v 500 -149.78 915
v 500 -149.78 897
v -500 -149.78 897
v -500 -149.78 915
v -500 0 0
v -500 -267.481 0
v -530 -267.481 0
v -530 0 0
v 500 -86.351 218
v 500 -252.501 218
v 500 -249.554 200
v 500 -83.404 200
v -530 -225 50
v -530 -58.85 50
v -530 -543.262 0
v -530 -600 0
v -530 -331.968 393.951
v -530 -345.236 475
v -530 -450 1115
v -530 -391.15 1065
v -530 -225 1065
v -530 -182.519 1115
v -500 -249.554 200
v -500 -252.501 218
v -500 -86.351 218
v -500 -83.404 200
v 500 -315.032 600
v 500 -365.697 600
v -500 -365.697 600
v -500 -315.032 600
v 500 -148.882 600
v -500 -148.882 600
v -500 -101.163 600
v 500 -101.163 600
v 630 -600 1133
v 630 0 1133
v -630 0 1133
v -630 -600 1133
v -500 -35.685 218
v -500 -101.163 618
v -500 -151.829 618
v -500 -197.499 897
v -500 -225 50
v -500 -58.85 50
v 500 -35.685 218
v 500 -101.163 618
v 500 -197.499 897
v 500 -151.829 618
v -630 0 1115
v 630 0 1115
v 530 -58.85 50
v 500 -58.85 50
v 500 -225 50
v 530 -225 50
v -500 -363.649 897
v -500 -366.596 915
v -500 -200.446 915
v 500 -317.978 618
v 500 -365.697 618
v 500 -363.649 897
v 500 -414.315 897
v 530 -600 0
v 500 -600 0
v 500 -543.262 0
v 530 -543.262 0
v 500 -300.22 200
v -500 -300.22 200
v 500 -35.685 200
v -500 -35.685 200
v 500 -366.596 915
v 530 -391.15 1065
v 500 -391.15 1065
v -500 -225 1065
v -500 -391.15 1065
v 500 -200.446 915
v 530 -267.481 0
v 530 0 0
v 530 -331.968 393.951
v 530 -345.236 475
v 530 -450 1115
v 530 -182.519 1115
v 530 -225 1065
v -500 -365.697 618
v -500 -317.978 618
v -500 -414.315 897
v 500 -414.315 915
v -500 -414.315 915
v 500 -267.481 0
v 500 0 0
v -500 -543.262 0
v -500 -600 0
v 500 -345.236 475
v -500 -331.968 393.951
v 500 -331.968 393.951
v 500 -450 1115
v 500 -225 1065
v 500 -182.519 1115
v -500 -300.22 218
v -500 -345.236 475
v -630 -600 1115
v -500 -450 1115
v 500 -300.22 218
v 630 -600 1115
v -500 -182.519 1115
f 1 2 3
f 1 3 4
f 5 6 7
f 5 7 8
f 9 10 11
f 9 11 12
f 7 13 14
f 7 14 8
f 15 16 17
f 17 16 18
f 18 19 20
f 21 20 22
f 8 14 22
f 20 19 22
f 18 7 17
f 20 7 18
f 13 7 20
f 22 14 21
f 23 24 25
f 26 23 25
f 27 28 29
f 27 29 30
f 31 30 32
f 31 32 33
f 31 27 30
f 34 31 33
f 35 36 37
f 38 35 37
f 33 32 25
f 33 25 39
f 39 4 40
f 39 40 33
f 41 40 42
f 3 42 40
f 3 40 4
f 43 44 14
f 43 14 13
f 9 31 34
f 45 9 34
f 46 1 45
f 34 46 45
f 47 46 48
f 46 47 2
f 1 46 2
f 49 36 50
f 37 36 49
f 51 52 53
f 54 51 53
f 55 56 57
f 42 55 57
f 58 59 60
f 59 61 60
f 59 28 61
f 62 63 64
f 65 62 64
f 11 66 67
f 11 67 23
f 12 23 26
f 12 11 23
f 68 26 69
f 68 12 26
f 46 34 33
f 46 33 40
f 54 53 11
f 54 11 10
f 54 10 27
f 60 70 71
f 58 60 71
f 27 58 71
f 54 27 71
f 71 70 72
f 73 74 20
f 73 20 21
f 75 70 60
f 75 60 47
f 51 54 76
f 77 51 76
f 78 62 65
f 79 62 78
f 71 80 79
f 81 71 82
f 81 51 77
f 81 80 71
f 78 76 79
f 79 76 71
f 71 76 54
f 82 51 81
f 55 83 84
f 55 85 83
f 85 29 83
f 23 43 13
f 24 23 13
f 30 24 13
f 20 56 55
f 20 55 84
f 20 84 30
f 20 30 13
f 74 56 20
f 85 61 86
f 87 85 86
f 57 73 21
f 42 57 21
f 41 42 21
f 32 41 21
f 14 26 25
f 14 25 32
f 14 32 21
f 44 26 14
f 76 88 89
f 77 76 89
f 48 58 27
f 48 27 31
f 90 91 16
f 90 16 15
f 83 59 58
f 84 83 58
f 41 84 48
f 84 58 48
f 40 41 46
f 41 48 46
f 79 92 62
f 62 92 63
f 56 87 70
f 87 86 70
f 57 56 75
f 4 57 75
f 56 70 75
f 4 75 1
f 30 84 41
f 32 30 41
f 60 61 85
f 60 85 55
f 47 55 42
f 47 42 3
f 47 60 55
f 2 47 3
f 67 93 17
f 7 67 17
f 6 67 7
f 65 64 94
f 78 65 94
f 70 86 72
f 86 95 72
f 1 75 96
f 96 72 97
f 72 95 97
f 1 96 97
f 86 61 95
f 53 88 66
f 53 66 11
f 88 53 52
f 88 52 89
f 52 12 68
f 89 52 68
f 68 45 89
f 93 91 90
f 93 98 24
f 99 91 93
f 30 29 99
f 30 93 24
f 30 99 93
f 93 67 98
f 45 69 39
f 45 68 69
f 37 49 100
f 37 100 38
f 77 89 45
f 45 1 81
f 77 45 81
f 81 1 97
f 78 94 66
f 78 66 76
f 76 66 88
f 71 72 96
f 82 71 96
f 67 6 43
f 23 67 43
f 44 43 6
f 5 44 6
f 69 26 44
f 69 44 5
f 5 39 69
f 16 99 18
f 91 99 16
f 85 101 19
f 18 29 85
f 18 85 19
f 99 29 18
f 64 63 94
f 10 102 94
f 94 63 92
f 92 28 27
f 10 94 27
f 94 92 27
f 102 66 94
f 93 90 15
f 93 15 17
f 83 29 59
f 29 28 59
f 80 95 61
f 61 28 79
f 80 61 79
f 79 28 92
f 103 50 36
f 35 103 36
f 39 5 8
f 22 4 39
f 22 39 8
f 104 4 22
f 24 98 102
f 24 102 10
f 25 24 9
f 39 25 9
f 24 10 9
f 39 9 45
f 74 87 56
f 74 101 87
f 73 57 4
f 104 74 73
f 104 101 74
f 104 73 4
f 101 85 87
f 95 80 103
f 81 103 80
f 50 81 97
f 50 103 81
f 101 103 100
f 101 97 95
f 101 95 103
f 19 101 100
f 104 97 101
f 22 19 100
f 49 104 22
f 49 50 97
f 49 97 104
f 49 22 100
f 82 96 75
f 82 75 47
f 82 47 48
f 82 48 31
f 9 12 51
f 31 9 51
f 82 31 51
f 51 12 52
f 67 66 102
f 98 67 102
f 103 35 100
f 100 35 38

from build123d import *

# Parameters (mm, degrees)
F2_DEPTH = 30
F3_W     = 630
F3_H     = 18
F4_DEPTH = 600
F5_W     = 264.534249
F5_H     = 18
F6_DEPTH = 500


with BuildPart() as f2:
    # F1 (on offset) → F2 (new body)
    with BuildSketch(Plane.YZ.offset(500)):
        Polygon((-543.262288, 0), (-331.96829, 393.950819), (-267.480748, 0), (0, 0), (-182.519252, 1115), (-450, 1115), (-345.235586, 475), (-600, 0), align=None)
        Polygon((-225, 50), (-391.149812, 1065), (-225, 1065), (-58.850188, 50), align=None, mode=Mode.SUBTRACT)
    extrude(amount=F2_DEPTH)

    # F3 (on Front) → F4 (join)
    with BuildSketch(Plane.XZ):
        with Locations((315, 1124)):
            Rectangle(F3_W, F3_H)
    extrude(amount=F4_DEPTH)

    # F5 (on Right) → F6 (join, through all)
    with BuildSketch(Plane.YZ):
        with Locations((-282.047497, 906)):
            Rectangle(F5_W, F5_H)
        with Locations((-233.430262, 609)):
            Rectangle(F5_W, F5_H)
        with Locations((-167.952503, 209)):
            Rectangle(F5_W, F5_H)
    extrude(amount=F6_DEPTH)

    # F7: F2 across plane


with BuildPart() as f2_1:
    add(f2.part)
    add(f2.part.mirror(Plane.YZ))


solid = f2_1.part
